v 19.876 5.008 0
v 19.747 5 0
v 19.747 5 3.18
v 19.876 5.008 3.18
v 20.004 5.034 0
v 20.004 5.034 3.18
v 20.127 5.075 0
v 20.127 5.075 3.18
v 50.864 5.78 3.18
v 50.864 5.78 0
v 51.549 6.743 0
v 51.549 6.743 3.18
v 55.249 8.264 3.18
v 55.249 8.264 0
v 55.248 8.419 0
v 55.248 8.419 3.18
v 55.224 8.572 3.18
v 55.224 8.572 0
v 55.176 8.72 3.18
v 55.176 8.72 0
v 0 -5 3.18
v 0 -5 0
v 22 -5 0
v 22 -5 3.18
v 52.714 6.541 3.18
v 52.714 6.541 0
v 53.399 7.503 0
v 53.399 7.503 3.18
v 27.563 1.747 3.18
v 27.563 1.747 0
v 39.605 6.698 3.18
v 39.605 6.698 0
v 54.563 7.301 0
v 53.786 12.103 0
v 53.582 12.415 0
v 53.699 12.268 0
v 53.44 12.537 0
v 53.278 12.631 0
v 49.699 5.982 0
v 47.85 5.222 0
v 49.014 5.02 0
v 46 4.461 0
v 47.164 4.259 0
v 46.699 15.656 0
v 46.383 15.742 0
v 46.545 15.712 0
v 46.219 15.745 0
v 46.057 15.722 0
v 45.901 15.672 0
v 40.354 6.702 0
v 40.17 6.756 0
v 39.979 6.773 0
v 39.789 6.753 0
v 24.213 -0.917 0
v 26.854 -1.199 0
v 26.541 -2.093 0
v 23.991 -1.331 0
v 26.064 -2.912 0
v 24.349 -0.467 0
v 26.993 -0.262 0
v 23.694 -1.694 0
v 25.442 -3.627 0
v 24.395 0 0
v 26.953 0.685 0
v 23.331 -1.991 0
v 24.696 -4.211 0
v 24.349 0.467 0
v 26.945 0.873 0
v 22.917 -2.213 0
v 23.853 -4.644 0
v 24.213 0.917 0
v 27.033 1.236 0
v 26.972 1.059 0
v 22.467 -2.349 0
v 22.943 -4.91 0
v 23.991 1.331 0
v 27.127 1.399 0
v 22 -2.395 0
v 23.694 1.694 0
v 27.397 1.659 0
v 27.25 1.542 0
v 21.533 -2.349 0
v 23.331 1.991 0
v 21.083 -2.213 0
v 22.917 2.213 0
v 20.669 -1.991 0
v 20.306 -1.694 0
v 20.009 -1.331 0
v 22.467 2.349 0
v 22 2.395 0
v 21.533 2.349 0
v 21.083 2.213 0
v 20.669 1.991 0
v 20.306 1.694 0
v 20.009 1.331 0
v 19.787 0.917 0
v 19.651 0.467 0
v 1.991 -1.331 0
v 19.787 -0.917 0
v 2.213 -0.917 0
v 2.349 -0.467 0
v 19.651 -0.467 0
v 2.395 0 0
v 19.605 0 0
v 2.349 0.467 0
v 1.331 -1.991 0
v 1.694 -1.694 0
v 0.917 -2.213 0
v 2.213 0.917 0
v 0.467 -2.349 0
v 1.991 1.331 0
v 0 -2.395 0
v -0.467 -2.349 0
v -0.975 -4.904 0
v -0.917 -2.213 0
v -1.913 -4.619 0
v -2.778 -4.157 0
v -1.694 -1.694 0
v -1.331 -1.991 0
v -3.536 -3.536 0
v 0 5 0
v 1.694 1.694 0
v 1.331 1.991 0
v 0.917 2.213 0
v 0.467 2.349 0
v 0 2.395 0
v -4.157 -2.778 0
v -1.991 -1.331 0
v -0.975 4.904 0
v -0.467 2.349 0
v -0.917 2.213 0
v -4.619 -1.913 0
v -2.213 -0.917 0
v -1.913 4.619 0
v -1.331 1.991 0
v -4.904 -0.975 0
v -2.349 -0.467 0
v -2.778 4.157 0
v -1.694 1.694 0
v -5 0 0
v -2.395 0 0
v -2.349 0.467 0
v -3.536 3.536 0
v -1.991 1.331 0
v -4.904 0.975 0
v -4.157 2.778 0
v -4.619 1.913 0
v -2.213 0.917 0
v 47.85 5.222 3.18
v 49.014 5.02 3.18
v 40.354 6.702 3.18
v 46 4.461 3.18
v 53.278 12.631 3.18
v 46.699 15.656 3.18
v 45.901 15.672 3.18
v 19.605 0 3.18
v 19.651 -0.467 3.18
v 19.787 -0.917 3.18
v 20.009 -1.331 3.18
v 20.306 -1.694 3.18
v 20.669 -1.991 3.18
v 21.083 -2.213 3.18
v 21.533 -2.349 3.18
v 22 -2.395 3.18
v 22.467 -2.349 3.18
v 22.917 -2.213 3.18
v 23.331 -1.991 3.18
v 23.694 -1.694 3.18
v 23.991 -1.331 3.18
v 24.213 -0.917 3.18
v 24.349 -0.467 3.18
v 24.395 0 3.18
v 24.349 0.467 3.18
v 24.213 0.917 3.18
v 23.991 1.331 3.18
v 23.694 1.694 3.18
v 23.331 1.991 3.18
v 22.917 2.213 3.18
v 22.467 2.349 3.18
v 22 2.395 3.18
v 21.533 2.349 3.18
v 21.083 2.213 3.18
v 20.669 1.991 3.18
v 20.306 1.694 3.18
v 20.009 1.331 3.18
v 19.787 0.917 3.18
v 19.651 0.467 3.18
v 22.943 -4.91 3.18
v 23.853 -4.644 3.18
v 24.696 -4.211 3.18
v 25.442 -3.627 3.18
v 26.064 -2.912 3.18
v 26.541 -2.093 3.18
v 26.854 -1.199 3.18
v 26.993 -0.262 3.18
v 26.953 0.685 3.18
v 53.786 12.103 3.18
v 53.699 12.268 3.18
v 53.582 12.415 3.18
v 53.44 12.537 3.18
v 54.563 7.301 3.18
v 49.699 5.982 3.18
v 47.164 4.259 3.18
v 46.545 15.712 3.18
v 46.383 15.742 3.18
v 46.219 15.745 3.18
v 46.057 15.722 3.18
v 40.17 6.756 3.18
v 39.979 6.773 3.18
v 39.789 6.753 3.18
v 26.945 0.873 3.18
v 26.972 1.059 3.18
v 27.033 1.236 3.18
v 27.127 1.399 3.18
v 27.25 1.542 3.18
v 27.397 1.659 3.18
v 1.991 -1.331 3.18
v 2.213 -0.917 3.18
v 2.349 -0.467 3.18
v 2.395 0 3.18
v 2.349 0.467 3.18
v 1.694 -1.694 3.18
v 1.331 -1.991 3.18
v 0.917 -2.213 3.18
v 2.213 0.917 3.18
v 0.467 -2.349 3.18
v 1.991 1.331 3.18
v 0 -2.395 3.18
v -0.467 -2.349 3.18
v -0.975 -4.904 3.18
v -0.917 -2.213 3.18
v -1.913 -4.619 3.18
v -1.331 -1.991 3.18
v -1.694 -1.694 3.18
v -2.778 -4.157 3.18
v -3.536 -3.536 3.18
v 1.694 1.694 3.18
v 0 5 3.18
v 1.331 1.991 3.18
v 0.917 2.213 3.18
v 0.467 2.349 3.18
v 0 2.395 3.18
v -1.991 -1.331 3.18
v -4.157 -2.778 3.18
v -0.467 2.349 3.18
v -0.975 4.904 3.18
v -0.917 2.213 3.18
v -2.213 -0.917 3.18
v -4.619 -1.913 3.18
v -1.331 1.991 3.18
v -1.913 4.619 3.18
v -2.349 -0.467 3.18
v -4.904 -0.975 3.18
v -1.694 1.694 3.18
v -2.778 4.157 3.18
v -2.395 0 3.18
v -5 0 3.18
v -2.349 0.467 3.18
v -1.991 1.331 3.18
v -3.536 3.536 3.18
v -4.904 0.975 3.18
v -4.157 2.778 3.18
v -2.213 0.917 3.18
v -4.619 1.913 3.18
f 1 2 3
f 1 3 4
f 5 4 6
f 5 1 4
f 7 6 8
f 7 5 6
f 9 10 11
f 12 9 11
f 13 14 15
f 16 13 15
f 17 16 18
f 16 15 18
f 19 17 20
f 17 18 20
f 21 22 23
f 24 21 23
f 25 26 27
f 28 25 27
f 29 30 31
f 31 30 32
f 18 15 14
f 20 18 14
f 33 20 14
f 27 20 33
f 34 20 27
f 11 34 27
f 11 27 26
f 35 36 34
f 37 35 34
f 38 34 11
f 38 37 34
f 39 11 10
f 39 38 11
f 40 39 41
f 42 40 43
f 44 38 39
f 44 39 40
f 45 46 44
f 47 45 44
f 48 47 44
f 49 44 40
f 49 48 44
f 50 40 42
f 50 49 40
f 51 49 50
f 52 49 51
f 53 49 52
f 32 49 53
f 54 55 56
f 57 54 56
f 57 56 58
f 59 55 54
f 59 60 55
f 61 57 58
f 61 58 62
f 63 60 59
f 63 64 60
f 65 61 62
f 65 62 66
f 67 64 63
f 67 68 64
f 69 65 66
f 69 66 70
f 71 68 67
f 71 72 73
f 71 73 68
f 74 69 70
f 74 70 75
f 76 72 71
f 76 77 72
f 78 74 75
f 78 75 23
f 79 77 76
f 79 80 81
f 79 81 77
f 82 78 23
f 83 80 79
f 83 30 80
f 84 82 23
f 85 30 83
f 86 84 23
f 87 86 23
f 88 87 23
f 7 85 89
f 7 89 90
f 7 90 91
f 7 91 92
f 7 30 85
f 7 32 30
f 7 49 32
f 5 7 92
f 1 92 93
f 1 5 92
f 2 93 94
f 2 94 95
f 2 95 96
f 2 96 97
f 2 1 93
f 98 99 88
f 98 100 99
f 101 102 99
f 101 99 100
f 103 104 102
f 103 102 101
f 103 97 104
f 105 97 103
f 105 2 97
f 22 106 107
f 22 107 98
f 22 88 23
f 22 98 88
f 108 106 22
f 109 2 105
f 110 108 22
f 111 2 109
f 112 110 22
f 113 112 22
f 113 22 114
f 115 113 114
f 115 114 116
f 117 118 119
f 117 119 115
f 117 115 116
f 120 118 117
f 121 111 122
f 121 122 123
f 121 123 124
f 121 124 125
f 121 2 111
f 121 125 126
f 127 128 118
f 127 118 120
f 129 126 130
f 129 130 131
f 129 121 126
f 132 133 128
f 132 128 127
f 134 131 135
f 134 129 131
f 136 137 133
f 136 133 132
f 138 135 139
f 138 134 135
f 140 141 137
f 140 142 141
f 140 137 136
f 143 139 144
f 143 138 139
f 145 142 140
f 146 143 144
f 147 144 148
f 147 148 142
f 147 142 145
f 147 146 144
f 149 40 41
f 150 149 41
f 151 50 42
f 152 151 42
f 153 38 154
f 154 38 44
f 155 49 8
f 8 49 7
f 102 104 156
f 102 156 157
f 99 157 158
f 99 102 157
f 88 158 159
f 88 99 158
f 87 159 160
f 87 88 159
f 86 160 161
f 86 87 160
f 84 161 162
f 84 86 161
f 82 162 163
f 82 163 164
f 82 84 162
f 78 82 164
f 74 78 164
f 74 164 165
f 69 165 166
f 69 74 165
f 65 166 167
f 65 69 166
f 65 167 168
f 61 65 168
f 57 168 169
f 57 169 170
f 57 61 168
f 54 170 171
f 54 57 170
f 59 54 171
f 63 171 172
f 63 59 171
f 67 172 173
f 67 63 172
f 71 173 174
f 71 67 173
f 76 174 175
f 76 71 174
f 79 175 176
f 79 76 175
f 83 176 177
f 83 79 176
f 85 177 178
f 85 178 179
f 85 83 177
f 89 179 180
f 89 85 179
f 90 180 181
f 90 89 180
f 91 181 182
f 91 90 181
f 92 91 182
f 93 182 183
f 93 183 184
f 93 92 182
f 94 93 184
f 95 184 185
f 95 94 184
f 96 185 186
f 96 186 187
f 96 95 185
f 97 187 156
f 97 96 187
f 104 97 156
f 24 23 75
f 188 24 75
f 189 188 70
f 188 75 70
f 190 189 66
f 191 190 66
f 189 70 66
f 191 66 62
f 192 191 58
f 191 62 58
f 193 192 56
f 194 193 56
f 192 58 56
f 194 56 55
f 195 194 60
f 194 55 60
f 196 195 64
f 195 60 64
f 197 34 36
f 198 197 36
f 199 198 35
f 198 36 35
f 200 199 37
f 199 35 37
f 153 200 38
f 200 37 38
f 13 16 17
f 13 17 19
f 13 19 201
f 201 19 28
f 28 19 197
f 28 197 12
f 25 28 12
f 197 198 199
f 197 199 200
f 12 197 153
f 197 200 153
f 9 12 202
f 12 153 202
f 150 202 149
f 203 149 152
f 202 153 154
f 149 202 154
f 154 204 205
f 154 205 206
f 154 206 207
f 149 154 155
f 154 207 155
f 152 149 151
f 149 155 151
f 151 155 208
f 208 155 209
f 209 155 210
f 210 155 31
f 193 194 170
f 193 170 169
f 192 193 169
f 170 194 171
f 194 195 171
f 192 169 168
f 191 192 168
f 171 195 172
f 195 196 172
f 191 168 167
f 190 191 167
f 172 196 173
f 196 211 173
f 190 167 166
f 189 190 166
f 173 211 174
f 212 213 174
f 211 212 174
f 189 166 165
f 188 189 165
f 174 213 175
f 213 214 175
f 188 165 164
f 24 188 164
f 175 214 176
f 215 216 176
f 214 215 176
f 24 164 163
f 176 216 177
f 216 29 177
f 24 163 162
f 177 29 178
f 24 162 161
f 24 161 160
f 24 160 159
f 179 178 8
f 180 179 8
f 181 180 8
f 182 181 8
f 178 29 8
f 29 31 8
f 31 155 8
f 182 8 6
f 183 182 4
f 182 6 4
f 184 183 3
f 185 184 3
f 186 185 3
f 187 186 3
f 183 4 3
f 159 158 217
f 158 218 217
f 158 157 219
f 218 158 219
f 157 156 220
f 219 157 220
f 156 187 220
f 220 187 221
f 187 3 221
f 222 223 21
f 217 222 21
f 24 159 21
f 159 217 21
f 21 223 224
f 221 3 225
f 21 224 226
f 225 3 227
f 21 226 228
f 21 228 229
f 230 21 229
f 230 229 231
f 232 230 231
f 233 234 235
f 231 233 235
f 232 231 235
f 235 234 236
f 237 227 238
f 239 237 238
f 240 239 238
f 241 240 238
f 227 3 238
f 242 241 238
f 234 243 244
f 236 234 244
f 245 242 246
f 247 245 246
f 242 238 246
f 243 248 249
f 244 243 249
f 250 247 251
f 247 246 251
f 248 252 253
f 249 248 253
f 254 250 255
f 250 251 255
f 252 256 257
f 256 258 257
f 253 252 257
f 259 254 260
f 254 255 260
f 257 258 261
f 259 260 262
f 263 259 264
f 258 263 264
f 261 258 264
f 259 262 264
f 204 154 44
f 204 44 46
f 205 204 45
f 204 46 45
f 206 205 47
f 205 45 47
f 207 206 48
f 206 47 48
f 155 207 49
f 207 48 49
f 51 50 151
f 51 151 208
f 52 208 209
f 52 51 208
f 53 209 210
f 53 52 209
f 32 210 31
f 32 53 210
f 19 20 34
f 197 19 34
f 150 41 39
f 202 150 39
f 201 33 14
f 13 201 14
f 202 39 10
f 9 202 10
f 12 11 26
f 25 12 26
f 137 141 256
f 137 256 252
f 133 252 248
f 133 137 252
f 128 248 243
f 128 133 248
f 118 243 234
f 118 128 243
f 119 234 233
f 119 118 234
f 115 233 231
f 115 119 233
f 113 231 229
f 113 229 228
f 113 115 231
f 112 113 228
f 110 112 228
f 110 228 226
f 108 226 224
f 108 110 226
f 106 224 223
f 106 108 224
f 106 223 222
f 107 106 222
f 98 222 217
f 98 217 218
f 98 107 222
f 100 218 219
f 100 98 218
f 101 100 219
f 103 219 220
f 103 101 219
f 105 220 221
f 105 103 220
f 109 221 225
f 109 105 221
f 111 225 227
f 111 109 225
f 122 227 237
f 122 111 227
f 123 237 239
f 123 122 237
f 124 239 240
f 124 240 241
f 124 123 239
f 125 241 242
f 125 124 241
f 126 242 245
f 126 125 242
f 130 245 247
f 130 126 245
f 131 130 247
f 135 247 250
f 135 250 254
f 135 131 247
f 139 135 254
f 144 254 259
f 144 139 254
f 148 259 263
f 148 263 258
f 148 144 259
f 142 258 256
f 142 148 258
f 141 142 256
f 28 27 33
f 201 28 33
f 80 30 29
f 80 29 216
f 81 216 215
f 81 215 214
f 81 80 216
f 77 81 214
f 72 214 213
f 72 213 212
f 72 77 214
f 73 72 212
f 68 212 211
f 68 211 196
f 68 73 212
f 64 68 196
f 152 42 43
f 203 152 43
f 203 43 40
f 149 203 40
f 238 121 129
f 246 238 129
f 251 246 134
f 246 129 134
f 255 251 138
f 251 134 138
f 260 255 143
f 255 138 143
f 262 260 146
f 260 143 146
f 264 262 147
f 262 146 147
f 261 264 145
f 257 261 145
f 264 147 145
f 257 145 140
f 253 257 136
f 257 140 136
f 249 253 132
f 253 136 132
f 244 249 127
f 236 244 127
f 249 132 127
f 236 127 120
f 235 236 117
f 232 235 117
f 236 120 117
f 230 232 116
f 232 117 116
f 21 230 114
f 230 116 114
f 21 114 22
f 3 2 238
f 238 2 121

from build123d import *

# Parameters (mm, degrees)
SKETCH1_R           = 2.395
BOSS_EXTRUDE1_DEPTH = 3.18
FILLET1_R           = 1


with BuildPart() as part:
    # Sketch1 → Boss-Extrude1 (new body)
    # profile 1 of 2: a face of its own
    with BuildSketch(Plane.XY):
        with BuildLine():
            Line((46.303280967, 15.837507263), (19.944251464, 5))
            Line((19.944251464, 5), (22, 5))
            ThreePointArc((22, 5), (24.987746861, 4.009160597), (26.791342796, 1.429347478))
            Line((26.791342796, 1.429347478), (39.978778977, 6.851358003))
            Line((39.978778977, 6.851358003), (45.999791823, 4.461390287))
            Line((45.999791823, 4.461390287), (47.164236001, 4.258980416))
            Line((47.164236001, 4.258980416), (47.849548279, 5.221917112))
            Line((47.849548279, 5.221917112), (49.013992457, 5.019507241))
            Line((49.013992457, 5.019507241), (49.699304735, 5.982443937))
            Line((49.699304735, 5.982443937), (50.863748914, 5.780034066))
            Line((50.863748914, 5.780034066), (51.549061192, 6.742970763))
            Line((51.549061192, 6.742970763), (52.71350537, 6.540560892))
            Line((52.71350537, 6.540560892), (53.398817648, 7.503497588))
            Line((53.398817648, 7.503497588), (54.563261826, 7.301087717))
            Line((54.563261826, 7.301087717), (55.248574104, 8.264024414))
            Line((55.248574104, 8.264024414), (55.347176821, 8.304564892))
            Line((55.347176821, 8.304564892), (53.635991464, 12.466516919))
            Line((53.635991464, 12.466516919), (46.303280967, 15.837507263))
        make_face()
    # profile 2 of 2: a face of its own
    with BuildSketch(Plane.XY):
        with BuildLine():
            ThreePointArc((22, -5), (27, 0), (22, 5))
            Line((22, 5), (0, 5))
            ThreePointArc((0, 5), (-5, 0), (0, -5))
            Line((0, -5), (22, -5))
        make_face()
        with Locations(Location((22, 0, 0), (0, 0, 180))):
            Circle(SKETCH1_R, mode=Mode.SUBTRACT)
        with Locations(Location((0, 0, 0), (0, 0, 180))):
            Circle(SKETCH1_R, mode=Mode.SUBTRACT)
    extrude(amount=BOSS_EXTRUDE1_DEPTH)

    # Fillet1
    # the kernel refuses this fillet: 1 mm, written as the material it adds along each edge
    with BuildSketch(Plane(origin=(39.978778977, 6.851358003, 0), x_dir=(-0.9248782281665482, -0.3802634127332084, 0), z_dir=(0, 0, 1))) as fillet1_piece_1:
        with BuildLine():
            CenterArc((FILLET1_R * 0.404026225835, FILLET1_R), FILLET1_R, 226, 44)
            Line((-FILLET1_R * 0.290632144624, FILLET1_R * 0.280660199661), (0, 0))
            Line((0, 0), (FILLET1_R * 0.404026225835, 0))
        make_face()
    extrude(amount=3.18)
    with BuildSketch(Plane(origin=(26.791342796, 1.429347478, 0), x_dir=(0.9248782281665486, 0.38026341273320724, 0), z_dir=(0, 0, 1))) as fillet1_piece_2:
        with BuildLine():
            CenterArc((0.834537834, -1), FILLET1_R, 90, 75.522487814)
            ThreePointArc((-0.133708003, -0.75), (-0.052548991, -0.377550259), (0, 0))
            Line((0, 0), (0.834537834, 0))
        make_face()
    extrude(amount=3.18)
    with BuildSketch(Plane(origin=(19.944251464, 5, 0), x_dir=(0.9248782281665495, 0.3802634127332051, 0), z_dir=(0, 0, 1))) as fillet1_piece_3:
        with BuildLine():
            CenterArc((FILLET1_R * 0.197551931945, FILLET1_R), FILLET1_R, 247.65, 22.35)
            Line((-FILLET1_R * 0.182711480788, FILLET1_R * 0.0751217718334), (0, 0))
            Line((0, 0), (FILLET1_R * 0.197551931945, 0))
        make_face()
    extrude(amount=3.18)
    # the kernel refuses this fillet: 1 mm, written as the material it takes off along each edge
    with BuildSketch(Plane(origin=(46.303280967, 15.837507263, -1.088047115), x_dir=(-0.9248782281665417, -0.38026341273322406, 0), z_dir=(0, 0, 1))) as fillet1_2_piece_1:
        with BuildLine():
            CenterArc((FILLET1_R * 0.43521884585, FILLET1_R), FILLET1_R, 222.960833652, 47.039166348)
            Line((-FILLET1_R * 0.296600886481, FILLET1_R * 0.318501739275), (0, 0))
            Line((0, 0), (FILLET1_R * 0.43521884585, 0))
        make_face()
    extrude(amount=5.356094229, mode=Mode.SUBTRACT)
    with BuildSketch(Plane(origin=(53.635991464, 12.466516919, -0.983789259), x_dir=(-0.9085871727996149, 0.41769528298031194, 0), z_dir=(0, 0, 1))) as fillet1_2_piece_2:
        with BuildLine():
            CenterArc((FILLET1_R * 0.393515703744, FILLET1_R), FILLET1_R, 227.039166348, 42.960833652)
            Line((-FILLET1_R * 0.287982556982, FILLET1_R * 0.268180267669), (0, 0))
            Line((0, 0), (FILLET1_R * 0.393515703744, 0))
        make_face()
    extrude(amount=5.147578519, mode=Mode.SUBTRACT)
    with BuildSketch(Plane(origin=(55.347176821, 8.304564892, -1.123212767), x_dir=(-0.9248782281666527, -0.38026341273295444, 0), z_dir=(0, 0, 1))) as fillet1_2_piece_3:
        with BuildLine():
            CenterArc((1, -0.449285107), FILLET1_R, 153.302173601, 26.697826399)
            Line((0, -0.449285107), (0, 0))
            Line((0, 0), (0.106611567, 0))
        make_face()
    extrude(amount=5.426425535, mode=Mode.SUBTRACT)


solid = part.part
